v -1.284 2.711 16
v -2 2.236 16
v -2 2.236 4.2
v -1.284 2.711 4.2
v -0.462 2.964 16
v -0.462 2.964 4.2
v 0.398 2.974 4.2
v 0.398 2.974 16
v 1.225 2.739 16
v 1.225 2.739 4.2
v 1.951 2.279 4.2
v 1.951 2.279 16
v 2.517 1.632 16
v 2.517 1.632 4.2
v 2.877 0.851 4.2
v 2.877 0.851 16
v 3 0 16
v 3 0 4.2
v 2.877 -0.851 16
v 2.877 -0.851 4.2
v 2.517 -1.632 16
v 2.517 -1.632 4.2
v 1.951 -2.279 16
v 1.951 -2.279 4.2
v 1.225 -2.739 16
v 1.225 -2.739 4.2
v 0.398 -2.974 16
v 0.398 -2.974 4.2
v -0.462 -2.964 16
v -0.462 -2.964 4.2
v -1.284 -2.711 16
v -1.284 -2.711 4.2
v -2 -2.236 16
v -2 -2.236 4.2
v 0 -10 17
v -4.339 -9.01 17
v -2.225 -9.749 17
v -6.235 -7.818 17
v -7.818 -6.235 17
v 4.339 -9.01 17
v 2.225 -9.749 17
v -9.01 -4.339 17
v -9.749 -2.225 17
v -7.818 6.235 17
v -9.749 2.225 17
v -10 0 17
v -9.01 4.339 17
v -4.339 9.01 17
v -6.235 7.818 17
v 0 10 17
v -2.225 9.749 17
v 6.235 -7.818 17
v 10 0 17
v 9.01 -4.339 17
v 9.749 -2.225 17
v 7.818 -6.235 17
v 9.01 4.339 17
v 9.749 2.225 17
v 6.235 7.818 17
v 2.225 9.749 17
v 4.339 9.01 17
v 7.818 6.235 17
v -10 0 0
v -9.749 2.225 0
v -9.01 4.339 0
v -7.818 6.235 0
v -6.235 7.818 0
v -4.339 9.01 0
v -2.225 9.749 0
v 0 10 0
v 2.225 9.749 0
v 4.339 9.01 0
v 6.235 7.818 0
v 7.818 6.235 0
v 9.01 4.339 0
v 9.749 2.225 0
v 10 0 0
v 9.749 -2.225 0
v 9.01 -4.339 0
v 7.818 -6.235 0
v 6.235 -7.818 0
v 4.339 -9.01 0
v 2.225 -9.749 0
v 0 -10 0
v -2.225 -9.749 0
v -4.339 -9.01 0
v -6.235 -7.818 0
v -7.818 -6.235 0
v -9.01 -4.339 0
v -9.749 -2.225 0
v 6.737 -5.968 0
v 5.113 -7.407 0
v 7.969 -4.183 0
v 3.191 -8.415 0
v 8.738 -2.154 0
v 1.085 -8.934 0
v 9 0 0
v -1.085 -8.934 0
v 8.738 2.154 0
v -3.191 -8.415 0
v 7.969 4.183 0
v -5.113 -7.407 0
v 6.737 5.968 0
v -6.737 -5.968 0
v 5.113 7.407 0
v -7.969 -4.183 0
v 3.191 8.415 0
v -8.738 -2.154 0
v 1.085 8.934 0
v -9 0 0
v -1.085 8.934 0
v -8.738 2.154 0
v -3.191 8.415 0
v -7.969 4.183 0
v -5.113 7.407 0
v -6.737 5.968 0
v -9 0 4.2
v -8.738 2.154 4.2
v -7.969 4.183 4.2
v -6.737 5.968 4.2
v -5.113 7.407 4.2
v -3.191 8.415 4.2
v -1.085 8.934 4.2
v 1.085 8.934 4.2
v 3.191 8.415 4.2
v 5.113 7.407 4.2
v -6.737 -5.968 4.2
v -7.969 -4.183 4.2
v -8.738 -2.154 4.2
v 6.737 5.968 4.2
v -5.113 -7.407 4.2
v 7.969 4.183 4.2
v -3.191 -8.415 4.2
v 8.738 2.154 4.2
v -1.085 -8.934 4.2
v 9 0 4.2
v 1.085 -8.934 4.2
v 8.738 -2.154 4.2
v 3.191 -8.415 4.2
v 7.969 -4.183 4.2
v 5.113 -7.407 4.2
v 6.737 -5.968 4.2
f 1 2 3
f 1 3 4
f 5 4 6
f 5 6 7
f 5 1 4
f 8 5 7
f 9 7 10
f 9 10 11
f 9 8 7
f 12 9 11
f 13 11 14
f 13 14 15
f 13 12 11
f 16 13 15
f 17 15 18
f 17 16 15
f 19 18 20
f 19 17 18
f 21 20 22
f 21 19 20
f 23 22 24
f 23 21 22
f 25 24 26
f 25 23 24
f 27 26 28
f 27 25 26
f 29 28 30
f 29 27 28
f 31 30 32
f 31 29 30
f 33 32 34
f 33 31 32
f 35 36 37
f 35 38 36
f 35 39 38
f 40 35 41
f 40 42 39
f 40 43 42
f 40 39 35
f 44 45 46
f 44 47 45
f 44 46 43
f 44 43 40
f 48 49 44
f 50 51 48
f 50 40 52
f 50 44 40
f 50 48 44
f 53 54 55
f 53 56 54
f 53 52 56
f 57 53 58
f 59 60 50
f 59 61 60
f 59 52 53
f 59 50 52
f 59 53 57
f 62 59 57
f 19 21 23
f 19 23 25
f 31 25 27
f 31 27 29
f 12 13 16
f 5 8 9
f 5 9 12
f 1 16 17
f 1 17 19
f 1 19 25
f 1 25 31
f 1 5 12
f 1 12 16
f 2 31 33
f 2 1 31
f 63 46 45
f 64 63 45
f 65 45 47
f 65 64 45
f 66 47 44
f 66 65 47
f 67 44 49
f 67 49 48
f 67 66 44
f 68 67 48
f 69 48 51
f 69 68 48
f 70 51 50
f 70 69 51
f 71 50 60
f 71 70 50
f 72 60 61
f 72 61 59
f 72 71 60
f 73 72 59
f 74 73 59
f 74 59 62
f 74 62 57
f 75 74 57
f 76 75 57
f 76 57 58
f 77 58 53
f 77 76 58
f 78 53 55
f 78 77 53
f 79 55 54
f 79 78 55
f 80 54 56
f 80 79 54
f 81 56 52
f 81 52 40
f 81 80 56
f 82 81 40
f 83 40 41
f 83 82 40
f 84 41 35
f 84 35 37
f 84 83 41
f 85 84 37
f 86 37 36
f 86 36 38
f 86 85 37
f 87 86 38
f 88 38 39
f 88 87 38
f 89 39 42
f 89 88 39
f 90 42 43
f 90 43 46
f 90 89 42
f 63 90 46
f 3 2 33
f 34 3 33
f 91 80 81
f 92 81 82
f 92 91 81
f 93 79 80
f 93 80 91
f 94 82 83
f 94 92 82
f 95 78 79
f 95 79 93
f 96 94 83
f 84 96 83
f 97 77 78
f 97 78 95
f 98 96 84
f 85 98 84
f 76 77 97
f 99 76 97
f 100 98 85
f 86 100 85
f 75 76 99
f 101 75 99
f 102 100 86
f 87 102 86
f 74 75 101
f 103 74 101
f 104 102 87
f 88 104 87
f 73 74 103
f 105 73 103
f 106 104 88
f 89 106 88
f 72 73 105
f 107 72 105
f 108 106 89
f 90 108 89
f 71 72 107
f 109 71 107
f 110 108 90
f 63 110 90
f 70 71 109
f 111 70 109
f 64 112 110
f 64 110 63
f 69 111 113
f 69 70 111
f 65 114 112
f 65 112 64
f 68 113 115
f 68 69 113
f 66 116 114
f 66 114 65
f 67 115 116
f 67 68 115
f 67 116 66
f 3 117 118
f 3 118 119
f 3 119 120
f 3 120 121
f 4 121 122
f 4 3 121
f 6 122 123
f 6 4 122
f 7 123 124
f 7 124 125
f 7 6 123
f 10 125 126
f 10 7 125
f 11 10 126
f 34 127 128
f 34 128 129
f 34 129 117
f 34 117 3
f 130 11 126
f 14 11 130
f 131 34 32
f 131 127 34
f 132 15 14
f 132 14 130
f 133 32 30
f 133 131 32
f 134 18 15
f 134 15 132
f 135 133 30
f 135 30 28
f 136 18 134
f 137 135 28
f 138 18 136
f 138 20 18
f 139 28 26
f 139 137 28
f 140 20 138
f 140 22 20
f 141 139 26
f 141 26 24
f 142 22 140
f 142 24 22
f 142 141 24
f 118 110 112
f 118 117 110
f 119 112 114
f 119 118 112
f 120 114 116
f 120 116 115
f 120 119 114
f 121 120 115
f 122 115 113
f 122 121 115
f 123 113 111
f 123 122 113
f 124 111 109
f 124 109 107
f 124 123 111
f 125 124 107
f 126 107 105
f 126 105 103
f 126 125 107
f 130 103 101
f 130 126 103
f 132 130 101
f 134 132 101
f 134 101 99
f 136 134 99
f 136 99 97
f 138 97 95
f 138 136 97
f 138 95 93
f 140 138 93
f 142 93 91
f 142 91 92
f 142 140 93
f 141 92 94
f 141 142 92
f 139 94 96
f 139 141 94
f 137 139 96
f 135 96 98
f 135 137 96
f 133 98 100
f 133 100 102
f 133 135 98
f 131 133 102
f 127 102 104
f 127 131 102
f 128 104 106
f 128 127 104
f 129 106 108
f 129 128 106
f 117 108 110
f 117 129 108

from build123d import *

# Parameters (mm, degrees)
F3_DEPTH = 11.8


with BuildPart() as f1:
    # F0 (on Front) → F1 (revolve)
    with BuildSketch(Plane.XZ):
        Polygon((0, 16), (0, 17), (-10, 17), (-10, 0), (-9, 0), (-9, 4.2), (-3, 4.2), (-3, 16), align=None)
    revolve(axis=Axis((0, 0, 11.945563), (0, 0, -1)))

    # F2 (on face) → F3 (join, through all)
    with BuildSketch(Plane(origin=(0, 0, 16), x_dir=(1, 0, 0), z_dir=(0, 0, -1))):
        with BuildLine():
            Line((-2, -2.236068), (-2, 2.236068))
            ThreePointArc((-2, 2.236068), (-3, 0), (-2, -2.236068))
        make_face()
    extrude(amount=F3_DEPTH)


solid = f1.part
